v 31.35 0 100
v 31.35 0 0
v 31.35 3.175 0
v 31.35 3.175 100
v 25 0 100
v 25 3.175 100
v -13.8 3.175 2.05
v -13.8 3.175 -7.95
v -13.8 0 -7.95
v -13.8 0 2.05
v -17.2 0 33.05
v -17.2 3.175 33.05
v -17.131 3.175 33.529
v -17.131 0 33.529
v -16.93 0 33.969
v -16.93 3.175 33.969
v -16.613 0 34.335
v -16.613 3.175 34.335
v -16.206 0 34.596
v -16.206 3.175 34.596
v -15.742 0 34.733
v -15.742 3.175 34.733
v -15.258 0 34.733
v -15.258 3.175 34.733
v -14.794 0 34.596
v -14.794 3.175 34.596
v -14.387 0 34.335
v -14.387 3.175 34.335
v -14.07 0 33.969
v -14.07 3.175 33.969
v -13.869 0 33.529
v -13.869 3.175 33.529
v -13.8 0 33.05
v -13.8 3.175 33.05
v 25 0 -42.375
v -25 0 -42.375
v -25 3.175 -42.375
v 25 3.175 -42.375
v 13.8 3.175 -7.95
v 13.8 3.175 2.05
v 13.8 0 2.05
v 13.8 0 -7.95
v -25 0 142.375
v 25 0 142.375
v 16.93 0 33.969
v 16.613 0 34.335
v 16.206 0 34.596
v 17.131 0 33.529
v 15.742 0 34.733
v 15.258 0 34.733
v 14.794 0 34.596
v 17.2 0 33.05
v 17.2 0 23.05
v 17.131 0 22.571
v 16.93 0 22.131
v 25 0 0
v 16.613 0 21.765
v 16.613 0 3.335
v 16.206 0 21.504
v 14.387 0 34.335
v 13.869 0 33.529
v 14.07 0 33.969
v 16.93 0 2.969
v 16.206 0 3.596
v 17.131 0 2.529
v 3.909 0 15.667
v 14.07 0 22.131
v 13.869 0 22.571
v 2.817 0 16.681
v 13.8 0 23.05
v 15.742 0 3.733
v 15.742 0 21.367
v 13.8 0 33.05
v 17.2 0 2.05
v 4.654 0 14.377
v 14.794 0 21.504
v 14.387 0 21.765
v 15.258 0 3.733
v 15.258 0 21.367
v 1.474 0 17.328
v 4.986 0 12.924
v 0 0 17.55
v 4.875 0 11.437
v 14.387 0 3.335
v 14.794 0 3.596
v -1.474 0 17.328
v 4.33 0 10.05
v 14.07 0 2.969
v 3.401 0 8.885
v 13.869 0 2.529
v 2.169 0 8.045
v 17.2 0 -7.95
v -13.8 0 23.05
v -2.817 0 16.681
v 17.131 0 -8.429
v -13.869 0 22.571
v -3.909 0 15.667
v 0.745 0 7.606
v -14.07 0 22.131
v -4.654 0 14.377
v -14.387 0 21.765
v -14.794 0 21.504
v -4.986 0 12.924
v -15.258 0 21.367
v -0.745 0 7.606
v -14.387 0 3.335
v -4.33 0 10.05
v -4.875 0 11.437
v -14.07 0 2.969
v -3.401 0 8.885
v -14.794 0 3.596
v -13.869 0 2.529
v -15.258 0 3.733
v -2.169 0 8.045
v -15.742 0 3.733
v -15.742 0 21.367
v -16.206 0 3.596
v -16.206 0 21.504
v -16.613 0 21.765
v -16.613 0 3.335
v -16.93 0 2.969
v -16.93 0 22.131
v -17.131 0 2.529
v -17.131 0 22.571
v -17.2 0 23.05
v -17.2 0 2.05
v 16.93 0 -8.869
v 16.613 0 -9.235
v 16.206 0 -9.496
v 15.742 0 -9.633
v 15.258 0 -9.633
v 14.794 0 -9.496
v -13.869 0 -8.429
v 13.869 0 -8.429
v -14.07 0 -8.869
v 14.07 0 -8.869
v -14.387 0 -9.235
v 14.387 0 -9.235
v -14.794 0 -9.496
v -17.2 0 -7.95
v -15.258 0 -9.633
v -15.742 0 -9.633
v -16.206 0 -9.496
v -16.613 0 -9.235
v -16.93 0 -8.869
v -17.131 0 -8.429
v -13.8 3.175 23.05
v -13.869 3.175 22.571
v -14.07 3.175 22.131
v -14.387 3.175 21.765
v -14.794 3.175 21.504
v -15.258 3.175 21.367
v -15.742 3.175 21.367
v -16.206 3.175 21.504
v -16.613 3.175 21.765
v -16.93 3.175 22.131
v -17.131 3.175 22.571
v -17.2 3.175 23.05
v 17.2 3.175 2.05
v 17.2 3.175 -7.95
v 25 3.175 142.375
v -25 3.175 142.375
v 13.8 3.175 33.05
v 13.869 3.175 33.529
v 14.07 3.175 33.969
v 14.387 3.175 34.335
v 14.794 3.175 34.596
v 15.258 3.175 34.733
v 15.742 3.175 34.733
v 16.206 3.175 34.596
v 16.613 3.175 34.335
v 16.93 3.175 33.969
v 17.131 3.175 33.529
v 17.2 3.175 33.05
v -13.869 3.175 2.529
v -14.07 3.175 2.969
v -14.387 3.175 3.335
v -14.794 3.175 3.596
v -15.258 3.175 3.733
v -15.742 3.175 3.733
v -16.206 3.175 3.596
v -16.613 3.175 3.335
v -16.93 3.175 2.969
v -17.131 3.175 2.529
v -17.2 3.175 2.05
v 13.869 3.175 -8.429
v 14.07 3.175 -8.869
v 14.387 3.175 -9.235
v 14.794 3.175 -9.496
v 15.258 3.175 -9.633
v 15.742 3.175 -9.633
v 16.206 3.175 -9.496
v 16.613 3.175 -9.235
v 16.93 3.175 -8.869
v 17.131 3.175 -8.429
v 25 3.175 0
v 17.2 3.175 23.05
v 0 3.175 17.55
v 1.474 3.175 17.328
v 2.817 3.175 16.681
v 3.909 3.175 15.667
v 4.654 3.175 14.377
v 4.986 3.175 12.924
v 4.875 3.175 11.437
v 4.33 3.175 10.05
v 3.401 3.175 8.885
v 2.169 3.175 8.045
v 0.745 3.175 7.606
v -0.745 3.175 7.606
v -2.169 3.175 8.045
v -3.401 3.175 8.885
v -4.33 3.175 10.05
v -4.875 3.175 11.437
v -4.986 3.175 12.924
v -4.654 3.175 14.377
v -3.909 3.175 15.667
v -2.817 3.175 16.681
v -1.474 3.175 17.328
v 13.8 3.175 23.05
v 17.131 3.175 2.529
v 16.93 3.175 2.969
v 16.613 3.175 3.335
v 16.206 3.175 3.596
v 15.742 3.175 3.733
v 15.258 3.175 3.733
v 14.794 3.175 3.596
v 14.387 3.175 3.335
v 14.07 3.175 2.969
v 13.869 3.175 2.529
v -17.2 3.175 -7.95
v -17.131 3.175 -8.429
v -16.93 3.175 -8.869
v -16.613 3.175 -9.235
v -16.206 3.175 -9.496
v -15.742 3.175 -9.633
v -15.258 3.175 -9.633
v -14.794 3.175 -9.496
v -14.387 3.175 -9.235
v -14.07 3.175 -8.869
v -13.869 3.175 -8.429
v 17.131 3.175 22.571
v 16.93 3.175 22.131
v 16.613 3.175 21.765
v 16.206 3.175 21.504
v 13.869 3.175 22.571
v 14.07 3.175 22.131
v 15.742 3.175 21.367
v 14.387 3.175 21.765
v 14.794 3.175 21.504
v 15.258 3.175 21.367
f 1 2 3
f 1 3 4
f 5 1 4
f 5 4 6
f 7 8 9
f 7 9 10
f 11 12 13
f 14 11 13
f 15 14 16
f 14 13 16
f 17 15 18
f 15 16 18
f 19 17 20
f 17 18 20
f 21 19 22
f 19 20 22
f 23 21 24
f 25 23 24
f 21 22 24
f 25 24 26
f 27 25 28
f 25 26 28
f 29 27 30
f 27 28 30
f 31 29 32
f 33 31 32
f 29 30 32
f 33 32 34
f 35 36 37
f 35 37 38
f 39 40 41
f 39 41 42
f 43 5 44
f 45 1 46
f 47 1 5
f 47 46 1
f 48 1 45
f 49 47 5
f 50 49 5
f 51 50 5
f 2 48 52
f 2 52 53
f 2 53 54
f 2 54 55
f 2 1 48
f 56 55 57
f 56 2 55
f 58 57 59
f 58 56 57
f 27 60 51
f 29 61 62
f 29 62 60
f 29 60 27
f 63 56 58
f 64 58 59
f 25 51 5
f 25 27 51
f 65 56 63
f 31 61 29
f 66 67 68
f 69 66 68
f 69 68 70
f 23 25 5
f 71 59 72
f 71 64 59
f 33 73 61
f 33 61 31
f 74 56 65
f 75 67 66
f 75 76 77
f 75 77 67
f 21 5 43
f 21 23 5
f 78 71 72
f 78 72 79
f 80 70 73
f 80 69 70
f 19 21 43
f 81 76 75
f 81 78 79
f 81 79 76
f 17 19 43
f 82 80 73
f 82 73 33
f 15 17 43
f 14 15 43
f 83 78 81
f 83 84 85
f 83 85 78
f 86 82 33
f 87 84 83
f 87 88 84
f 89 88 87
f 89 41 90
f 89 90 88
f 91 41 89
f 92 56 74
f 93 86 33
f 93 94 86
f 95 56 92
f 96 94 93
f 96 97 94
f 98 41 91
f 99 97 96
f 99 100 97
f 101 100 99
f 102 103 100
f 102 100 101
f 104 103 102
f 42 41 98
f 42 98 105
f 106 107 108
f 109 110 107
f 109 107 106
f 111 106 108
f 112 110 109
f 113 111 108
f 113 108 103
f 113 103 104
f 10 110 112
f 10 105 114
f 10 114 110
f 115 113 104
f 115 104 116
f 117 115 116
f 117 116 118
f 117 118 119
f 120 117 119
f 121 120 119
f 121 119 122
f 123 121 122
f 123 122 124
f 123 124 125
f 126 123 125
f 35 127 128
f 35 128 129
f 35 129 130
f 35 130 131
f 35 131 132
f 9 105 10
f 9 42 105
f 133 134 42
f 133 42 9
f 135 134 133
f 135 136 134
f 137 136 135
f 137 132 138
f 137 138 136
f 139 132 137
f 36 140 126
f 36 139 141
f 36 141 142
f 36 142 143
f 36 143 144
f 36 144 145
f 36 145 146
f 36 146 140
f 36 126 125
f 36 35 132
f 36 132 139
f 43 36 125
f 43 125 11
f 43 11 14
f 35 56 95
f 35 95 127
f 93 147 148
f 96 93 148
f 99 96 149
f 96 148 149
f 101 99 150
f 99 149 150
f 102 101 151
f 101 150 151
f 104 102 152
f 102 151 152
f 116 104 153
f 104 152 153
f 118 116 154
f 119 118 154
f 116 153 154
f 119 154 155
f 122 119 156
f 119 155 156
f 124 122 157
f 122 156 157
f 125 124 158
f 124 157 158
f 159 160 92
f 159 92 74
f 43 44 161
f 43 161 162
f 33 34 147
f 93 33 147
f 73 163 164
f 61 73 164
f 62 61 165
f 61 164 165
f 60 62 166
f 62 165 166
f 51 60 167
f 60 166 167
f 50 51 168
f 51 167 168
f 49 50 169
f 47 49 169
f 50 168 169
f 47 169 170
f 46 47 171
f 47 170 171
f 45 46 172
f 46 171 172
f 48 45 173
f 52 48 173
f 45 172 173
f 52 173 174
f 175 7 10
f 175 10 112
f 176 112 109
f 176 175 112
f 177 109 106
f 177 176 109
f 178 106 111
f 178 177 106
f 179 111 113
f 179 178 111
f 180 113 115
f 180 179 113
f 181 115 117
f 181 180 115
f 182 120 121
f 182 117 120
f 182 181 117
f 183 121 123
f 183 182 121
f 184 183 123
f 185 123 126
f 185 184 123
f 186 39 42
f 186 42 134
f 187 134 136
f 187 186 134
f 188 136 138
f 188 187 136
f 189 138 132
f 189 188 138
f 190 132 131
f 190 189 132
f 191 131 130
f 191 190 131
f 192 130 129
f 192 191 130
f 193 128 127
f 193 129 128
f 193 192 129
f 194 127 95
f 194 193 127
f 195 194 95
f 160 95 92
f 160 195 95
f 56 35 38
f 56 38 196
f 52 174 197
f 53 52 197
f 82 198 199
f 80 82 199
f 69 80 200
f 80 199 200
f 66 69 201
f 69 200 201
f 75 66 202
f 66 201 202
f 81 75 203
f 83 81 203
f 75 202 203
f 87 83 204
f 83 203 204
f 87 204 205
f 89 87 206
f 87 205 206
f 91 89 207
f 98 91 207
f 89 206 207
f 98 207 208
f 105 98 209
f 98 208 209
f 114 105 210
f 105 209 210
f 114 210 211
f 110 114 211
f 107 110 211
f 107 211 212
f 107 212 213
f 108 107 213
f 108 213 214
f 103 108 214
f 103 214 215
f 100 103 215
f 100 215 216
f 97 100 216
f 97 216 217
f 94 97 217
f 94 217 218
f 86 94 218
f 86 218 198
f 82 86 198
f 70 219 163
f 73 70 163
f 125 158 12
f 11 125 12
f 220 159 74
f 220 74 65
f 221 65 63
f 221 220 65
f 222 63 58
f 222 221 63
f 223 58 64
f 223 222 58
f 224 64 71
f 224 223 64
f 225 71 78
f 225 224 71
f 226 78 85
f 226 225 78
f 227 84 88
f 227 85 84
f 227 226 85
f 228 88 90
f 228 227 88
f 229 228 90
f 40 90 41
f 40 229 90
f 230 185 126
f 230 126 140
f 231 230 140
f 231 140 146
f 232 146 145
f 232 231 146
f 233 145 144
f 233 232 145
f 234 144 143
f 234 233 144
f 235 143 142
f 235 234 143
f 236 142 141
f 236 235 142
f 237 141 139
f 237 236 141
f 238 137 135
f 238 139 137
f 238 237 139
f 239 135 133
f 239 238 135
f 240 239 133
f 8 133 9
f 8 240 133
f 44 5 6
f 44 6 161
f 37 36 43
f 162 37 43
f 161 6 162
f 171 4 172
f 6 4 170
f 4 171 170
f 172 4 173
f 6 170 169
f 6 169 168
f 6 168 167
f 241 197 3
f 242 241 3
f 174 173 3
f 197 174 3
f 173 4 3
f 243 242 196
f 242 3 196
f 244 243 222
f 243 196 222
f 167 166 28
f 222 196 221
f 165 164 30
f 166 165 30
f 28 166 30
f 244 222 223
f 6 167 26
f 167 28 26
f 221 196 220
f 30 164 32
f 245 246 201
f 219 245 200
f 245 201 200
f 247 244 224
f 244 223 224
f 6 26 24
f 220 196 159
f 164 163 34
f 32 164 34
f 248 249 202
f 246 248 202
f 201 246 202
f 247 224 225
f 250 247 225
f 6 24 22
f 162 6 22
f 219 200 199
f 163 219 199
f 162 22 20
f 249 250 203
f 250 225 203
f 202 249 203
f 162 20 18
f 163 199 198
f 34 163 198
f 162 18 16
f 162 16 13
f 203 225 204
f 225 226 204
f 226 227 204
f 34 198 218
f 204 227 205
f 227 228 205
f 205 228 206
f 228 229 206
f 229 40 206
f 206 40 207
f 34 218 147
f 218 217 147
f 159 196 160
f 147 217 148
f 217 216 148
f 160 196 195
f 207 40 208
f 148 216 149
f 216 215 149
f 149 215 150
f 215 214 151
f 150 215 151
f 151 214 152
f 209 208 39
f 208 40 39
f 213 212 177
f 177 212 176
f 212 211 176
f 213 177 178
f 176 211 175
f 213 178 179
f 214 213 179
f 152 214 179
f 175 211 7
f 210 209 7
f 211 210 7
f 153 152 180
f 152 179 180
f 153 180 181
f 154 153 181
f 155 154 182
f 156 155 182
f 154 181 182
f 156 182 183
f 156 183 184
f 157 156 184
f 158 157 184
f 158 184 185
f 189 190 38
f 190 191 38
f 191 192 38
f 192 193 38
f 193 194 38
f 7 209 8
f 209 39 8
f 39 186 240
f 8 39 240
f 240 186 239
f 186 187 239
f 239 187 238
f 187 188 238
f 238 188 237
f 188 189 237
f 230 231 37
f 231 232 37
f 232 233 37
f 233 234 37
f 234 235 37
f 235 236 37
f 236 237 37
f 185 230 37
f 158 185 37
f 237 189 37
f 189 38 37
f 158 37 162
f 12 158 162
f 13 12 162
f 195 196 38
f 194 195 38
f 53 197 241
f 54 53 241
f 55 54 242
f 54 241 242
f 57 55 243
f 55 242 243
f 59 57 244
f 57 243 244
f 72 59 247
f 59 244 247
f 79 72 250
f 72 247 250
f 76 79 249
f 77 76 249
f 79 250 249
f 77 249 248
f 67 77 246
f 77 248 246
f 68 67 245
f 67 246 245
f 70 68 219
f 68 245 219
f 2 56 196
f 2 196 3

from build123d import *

# Parameters (mm, degrees)
BOSS_EXTRUDE1_DEPTH  = 3.175
SKETCH2_R            = 5
CUT_EXTRUDE1_DEPTH   = 146.820244651
M3_CLEARANCE_HOLE1_D = 3.4
CUT_EXTRUDE2_DEPTH   = 146.820244651


with BuildPart() as part:
    # Sketch1 → Boss-Extrude1 (new body)
    with BuildSketch(Plane(origin=(0, 0, 0), x_dir=(1, 0, 0), z_dir=(0, 1, 0))):
        Polygon((-25, 0), (-25, 42.375), (25, 42.375), (25, 0), (31.35, 0), (31.35, -100), (25, -100), (25, -142.375), (-25, -142.375), (-25, -100), align=None)
    extrude(amount=BOSS_EXTRUDE1_DEPTH)

    # Sketch2 → Cut-Extrude1 (cut, through all)
    with BuildSketch(Plane(origin=(0, 3.175, 0), x_dir=(1, 0, 0), z_dir=(0, 1, 0))):
        with Locations(Location((0, -12.55, 0), (0, 0, 270))):
            Circle(SKETCH2_R)
    extrude(amount=-CUT_EXTRUDE1_DEPTH, mode=Mode.SUBTRACT)

    # M3 Clearance Hole1 (through all)
    with Locations(Plane(origin=(0, 3.175, 0), x_dir=(1, 0, 0), z_dir=(0, 1, 0))):
        with Locations((-15.5, 2.95), (15.5, 2.95), (15.5, -28.05), (-15.5, -28.05)):
            Hole(M3_CLEARANCE_HOLE1_D / 2)

    # Sketch7 → Cut-Extrude2 (cut, through all)
    with BuildSketch(Plane(origin=(0, 3.175, 0), x_dir=(1, 0, 0), z_dir=(0, 1, 0))):
        with BuildLine():
            Line((17.2, 7.95), (17.2, -2.05))
            ThreePointArc((17.2, -2.05), (15.5, -3.75), (13.8, -2.05))
            Line((13.8, -2.05), (13.8, 7.95))
            ThreePointArc((13.8, 7.95), (15.5, 9.65), (17.2, 7.95))
        make_face()
        with BuildLine():
            Line((-13.8, 7.95), (-13.8, -2.05))
            ThreePointArc((-13.8, -2.05), (-15.5, -3.75), (-17.2, -2.05))
            Line((-17.2, -2.05), (-17.2, 7.95))
            ThreePointArc((-17.2, 7.95), (-15.5, 9.65), (-13.8, 7.95))
        make_face()
        with BuildLine():
            Line((17.2, -33.05), (17.2, -23.05))
            ThreePointArc((17.2, -23.05), (15.5, -21.35), (13.8, -23.05))
            Line((13.8, -23.05), (13.8, -33.05))
            ThreePointArc((13.8, -33.05), (15.5, -34.75), (17.2, -33.05))
        make_face()
        with BuildLine():
            Line((-13.8, -33.05), (-13.8, -23.05))
            ThreePointArc((-13.8, -23.05), (-15.5, -21.35), (-17.2, -23.05))
            Line((-17.2, -23.05), (-17.2, -33.05))
            ThreePointArc((-17.2, -33.05), (-15.5, -34.75), (-13.8, -33.05))
        make_face()
    extrude(amount=-CUT_EXTRUDE2_DEPTH, mode=Mode.SUBTRACT)


solid = part.part
